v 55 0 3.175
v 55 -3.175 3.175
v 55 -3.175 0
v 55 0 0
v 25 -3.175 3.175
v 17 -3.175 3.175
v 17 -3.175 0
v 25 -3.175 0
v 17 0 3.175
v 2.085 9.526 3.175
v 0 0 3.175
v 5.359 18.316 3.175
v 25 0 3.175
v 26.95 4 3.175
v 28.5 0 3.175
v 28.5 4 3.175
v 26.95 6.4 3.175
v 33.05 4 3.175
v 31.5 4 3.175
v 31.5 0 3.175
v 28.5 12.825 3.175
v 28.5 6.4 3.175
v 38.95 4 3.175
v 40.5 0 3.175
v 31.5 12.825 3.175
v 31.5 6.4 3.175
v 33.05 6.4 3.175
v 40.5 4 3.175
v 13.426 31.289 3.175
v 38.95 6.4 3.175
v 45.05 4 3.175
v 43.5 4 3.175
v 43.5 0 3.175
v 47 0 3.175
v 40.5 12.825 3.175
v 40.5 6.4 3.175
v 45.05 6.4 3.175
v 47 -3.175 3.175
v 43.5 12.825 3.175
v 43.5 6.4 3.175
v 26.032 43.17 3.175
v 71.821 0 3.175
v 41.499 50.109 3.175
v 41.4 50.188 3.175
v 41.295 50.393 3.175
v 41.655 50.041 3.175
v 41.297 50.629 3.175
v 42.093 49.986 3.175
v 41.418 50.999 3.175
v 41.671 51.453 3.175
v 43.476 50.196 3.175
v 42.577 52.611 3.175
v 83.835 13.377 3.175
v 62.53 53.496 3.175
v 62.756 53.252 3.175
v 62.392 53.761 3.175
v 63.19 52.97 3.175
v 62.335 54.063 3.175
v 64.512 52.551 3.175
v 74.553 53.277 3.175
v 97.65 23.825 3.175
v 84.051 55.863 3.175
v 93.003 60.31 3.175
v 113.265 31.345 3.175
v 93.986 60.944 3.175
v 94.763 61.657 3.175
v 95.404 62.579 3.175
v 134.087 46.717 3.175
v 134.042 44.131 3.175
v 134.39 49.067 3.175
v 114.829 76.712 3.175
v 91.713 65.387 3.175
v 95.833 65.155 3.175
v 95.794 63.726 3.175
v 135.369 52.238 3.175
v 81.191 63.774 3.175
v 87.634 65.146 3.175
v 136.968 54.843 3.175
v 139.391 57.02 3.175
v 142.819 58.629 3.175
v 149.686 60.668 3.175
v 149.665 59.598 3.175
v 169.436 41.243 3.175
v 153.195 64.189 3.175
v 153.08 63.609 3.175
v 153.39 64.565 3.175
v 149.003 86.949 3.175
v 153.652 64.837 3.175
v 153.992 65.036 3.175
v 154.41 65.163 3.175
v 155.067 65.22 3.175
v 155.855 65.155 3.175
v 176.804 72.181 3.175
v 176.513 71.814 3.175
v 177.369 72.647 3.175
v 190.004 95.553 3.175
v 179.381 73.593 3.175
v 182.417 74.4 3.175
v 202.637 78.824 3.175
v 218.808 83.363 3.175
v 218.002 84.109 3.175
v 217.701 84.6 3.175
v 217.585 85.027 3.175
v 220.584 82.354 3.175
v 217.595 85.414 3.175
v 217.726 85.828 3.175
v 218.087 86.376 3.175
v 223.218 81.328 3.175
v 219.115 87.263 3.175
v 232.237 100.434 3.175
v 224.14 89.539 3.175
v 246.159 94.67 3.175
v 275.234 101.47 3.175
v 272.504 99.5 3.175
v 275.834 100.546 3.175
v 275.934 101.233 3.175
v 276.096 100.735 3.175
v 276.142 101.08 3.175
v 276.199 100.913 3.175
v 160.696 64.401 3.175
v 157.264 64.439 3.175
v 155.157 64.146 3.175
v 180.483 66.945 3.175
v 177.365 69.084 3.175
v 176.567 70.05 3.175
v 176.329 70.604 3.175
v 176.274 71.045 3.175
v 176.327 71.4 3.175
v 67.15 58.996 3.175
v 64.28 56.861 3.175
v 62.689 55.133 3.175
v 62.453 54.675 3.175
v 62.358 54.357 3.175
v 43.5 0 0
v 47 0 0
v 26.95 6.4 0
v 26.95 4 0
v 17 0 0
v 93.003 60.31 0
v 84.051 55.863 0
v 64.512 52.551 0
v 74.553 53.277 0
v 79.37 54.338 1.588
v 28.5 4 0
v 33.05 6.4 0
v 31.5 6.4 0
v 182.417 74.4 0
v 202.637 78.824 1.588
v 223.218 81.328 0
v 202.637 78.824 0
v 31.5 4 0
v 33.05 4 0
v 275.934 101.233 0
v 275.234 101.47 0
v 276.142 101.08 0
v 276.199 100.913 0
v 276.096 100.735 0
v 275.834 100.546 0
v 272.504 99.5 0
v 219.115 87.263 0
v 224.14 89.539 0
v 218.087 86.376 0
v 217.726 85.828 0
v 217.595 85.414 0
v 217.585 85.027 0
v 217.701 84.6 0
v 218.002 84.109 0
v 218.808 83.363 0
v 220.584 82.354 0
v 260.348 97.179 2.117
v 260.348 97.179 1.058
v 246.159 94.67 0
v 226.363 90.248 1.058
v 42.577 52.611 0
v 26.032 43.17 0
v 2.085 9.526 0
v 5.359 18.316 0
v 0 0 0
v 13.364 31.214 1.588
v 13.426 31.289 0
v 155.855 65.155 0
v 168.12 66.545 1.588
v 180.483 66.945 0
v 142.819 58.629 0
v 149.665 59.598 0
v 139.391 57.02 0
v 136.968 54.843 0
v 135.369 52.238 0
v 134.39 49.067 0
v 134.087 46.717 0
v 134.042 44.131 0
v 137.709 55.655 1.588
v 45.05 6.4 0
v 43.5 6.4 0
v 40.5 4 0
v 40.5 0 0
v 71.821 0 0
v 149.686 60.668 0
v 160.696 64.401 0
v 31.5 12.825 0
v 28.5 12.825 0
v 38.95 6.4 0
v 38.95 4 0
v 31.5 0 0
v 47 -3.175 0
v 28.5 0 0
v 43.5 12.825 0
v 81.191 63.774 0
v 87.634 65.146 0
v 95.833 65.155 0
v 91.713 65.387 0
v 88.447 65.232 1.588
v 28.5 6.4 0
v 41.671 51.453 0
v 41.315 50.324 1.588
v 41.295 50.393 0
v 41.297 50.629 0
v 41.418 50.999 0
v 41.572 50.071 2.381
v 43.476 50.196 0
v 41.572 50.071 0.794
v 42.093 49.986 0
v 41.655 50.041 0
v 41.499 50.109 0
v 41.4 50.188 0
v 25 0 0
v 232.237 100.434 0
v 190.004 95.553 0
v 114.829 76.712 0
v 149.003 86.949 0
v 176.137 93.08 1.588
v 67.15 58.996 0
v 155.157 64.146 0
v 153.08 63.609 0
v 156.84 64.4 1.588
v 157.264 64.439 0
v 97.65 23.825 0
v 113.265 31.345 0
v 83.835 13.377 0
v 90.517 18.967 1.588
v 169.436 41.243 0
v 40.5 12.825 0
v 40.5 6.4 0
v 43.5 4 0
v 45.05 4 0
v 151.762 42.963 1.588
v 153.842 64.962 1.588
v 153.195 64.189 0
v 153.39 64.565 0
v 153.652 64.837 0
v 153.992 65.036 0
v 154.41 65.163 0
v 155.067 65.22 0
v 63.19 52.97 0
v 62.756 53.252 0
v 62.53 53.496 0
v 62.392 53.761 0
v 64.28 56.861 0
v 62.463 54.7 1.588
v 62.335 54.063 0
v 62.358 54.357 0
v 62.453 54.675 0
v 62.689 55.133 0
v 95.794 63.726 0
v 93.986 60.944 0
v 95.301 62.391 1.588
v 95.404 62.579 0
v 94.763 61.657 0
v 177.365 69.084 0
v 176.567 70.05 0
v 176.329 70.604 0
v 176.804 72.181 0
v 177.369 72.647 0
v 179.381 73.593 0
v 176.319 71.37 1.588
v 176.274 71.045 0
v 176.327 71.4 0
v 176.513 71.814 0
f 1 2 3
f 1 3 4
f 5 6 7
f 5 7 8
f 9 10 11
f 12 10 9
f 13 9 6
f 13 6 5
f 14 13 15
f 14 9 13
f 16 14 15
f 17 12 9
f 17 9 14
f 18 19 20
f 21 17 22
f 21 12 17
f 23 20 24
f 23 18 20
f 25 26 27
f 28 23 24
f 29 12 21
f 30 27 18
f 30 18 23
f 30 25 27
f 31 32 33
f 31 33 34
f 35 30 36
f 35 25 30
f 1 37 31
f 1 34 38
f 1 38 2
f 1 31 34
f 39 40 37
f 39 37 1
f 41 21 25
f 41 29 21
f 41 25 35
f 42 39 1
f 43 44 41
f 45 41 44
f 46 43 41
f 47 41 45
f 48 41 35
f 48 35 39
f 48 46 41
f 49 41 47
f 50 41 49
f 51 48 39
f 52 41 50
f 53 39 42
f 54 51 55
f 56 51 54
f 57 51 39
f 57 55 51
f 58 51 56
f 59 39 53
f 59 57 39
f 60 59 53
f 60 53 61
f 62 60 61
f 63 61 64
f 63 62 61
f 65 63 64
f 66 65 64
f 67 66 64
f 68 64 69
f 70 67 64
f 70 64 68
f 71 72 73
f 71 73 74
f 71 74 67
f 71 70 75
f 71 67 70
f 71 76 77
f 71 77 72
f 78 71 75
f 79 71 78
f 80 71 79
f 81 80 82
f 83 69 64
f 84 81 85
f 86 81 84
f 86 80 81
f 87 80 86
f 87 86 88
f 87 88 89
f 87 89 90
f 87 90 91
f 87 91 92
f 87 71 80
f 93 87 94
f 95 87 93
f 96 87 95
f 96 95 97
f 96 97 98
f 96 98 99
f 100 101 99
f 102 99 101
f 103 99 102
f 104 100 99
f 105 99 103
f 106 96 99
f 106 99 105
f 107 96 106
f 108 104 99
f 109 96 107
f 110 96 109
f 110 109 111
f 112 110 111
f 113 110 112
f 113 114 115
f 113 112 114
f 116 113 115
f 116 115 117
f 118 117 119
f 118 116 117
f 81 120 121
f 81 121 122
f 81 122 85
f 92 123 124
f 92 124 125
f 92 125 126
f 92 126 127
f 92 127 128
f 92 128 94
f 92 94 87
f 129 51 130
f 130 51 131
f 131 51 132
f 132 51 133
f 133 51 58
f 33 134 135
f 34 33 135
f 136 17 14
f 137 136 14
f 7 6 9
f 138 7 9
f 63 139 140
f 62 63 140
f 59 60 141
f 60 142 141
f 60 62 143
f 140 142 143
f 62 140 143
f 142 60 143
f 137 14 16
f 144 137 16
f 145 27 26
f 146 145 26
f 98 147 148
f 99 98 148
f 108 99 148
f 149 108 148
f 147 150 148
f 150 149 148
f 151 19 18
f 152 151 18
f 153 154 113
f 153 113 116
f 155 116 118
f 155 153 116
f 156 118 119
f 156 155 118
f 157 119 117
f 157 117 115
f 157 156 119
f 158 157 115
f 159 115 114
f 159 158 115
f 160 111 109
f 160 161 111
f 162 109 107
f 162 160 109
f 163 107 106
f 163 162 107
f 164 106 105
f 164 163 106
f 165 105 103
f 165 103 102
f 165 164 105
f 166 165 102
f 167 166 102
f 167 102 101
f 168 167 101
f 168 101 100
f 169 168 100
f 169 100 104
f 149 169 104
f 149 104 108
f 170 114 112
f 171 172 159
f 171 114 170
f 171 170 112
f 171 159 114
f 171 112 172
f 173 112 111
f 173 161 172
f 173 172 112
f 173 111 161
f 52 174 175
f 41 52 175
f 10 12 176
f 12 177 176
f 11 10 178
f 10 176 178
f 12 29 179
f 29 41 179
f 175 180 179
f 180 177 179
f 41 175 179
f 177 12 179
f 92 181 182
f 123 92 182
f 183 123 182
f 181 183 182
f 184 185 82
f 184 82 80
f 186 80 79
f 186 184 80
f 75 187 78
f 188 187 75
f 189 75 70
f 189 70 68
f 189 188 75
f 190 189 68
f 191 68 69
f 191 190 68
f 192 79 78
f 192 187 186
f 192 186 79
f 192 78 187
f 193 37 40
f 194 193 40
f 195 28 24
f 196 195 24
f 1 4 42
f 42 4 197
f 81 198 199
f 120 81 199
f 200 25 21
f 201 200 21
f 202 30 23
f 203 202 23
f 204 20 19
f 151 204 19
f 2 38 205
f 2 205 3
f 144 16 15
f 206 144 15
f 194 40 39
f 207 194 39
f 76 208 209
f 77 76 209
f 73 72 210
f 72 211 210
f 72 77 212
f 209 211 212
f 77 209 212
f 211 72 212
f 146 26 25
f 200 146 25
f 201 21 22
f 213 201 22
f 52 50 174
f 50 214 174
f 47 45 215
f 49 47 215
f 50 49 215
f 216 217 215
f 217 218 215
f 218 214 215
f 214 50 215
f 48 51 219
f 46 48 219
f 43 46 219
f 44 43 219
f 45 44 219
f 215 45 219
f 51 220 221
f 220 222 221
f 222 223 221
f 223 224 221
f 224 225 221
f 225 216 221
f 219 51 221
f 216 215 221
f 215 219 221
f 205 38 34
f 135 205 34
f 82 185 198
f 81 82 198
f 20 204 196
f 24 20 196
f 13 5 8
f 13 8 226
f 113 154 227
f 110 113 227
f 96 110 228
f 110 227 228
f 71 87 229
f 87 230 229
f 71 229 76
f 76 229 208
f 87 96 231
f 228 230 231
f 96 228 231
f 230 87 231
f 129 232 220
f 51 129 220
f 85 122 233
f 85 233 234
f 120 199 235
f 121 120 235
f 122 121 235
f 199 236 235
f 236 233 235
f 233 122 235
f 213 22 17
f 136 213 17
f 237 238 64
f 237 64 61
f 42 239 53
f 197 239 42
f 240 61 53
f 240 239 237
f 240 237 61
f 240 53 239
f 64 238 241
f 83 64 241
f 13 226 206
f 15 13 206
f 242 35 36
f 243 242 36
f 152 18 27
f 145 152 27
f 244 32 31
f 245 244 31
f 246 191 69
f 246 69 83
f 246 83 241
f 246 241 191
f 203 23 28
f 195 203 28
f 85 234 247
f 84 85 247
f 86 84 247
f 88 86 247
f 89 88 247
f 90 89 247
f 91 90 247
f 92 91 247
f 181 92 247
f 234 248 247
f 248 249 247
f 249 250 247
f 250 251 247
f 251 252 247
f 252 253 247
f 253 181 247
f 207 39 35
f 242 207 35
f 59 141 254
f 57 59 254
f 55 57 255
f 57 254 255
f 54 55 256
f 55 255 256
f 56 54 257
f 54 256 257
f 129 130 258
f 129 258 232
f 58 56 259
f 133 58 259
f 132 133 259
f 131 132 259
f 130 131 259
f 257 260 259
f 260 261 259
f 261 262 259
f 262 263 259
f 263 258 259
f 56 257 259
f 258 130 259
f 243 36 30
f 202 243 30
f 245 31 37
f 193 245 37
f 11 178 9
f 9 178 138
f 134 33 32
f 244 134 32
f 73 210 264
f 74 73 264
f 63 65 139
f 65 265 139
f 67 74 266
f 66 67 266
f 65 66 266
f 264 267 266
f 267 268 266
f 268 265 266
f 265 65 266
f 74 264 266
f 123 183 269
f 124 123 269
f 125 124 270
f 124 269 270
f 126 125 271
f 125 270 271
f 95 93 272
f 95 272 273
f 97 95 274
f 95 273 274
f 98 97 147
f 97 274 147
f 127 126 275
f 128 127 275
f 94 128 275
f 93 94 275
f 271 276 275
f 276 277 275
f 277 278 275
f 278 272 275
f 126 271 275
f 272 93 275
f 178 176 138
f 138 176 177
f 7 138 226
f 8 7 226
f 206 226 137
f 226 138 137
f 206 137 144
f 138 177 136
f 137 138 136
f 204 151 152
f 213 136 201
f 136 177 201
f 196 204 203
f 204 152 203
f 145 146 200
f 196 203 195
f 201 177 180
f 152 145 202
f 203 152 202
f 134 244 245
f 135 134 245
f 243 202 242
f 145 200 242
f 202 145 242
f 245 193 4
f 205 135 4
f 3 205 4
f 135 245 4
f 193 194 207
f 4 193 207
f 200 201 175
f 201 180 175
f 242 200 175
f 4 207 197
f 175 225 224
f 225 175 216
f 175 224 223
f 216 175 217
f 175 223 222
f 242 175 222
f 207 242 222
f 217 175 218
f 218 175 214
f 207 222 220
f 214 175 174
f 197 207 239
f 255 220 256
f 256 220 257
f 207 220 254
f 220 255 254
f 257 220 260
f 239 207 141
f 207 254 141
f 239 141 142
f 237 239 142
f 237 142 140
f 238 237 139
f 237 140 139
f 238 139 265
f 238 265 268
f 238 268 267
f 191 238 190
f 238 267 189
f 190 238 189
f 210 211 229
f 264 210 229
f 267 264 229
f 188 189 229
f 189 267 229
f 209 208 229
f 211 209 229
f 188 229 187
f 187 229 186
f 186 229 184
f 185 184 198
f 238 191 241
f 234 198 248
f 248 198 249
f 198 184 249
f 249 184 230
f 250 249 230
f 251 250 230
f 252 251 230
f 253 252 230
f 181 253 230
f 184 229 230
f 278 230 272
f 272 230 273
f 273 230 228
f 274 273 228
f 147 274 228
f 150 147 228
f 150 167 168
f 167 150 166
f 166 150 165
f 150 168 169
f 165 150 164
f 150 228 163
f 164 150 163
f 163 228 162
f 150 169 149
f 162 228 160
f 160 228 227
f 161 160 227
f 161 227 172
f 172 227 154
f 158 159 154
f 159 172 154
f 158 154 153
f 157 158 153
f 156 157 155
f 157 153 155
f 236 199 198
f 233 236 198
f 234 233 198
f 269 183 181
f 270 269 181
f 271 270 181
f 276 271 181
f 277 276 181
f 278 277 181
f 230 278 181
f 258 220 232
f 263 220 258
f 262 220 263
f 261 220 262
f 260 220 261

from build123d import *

# Parameters (mm, degrees)
BOSS_EXTRUDE1_DEPTH = 3.175
SKETCH3_W           = 8
SKETCH3_H           = 3.175
BOSS_EXTRUDE2_DEPTH = 3.175
CUT_EXTRUDE1_DEPTH  = 295.302026077


with BuildPart() as part:
    # Sketch2 → Boss-Extrude1 (new body)
    with BuildSketch(Plane.XY):
        with BuildLine():
            Line((0, 0), (71.821224644, 0))
            add(Edge.make_bspline(
                [(113.265068403, 31.345085694), (88.49122235, 22.260941948), (71.821224644, 0)],
                knots=[0, 0, 0, 1, 1, 1], degree=2))
            Line((113.265068403, 31.345085694), (169.435947463, 41.242848876))
            add(Edge.make_bspline(
                [(134.041587412, 44.130878692), (151.78543129, 43.239991284), (169.435947463, 41.242848876)],
                knots=[0, 0, 0, 1, 1, 1], degree=2))
            add(Edge.make_bspline(
                [(149.664509426, 59.598208841), (133.564564098, 59.446315657), (134.041587412, 44.130878692)],
                knots=[0, 0, 0, 1, 1, 1], degree=2))
            Line((149.664509426, 59.598208841), (149.685676558, 60.6678268))
            Line((149.685676558, 60.6678268), (160.696312712, 64.401472217))
            add(Edge.make_bspline(
                [(160.696312712, 64.401472217), (156.792494019, 64.794773064), (153.080099679, 63.60900386)],
                knots=[0, 0, 0, 1, 1, 1], degree=2))
            add(Edge.make_bspline(
                [(153.080099679, 63.60900386), (153.21581852, 65.543109048), (155.855294119, 65.154686594)],
                knots=[0, 0, 0, 1, 1, 1], degree=2))
            add(Edge.make_bspline(
                [(155.855294119, 65.154686594), (168.070276532, 67.039683705), (180.482777211, 66.945466473)],
                knots=[0, 0, 0, 1, 1, 1], degree=2))
            add(Edge.make_bspline(
                [(180.482777211, 66.945466473), (171.187708605, 72.067803505), (182.417352528, 74.400222782)],
                knots=[0, 0, 0, 1, 1, 1], degree=2))
            add(Edge.make_bspline(
                [(182.417352528, 74.400222782), (202.456511943, 79.784692432), (223.217555695, 81.328050857)],
                knots=[0, 0, 0, 1, 1, 1], degree=2))
            add(Edge.make_bspline(
                [(275.233904512, 101.469551945), (286.543816843, 98.715878969), (194.296992898, 91.024580871), (223.217555695, 81.328050857)],
                knots=[0, 0, 0, 0, 1, 1, 1, 1], degree=3))
            add(Edge.make_bspline(
                [(275.233904512, 101.469551945), (174.061816158, 103.537553967), (81.190900328, 63.774105239)],
                knots=[0, 0, 0, 1, 1, 1], degree=2))
            add(Edge.make_bspline(
                [(81.190900328, 63.774105239), (88.381783724, 65.999307209), (95.832537282, 65.154686594)],
                knots=[0, 0, 0, 1, 1, 1], degree=2))
            add(Edge.make_bspline(
                [(95.832537282, 65.154686594), (96.183075401, 62.049994654), (93.003333324, 60.309886397)],
                knots=[0, 0, 0, 1, 1, 1], degree=2))
            add(Edge.make_bspline(
                [(93.003333324, 60.309886397), (79.982990497, 52.245061614), (64.511543782, 52.550984526)],
                knots=[0, 0, 0, 1, 1, 1], degree=2))
            add(Edge.make_bspline(
                [(64.511543782, 52.550984526), (59.095264392, 53.626200699), (67.149577001, 58.996482621)],
                knots=[0, 0, 0, 1, 1, 1], degree=2))
            Line((67.149577001, 58.996482621), (43.476372801, 50.196200023))
            add(Edge.make_bspline(
                [(43.476372801, 50.196200023), (39.603225427, 49.243326926), (42.576727954, 52.611474892)],
                knots=[0, 0, 0, 1, 1, 1], degree=2))
            add(Edge.make_bspline(
                [(42.576727954, 52.611474892), (5.440445948, 36.121326287), (0, 0)],
                knots=[0, 0, 0, 1, 1, 1], degree=2))
        make_face()
    extrude(amount=BOSS_EXTRUDE1_DEPTH)

    # Sketch3 → Boss-Extrude2 (add)
    with BuildSketch(Plane.XY.offset(3.175)):
        with Locations((21, -1.5875)):
            Rectangle(SKETCH3_W, SKETCH3_H)
        with Locations((51, -1.5875)):
            Rectangle(SKETCH3_W, SKETCH3_H)
    extrude(amount=-BOSS_EXTRUDE2_DEPTH)

    # Sketch4 → Cut-Extrude1 (cut, through all)
    with BuildSketch(Plane.XY.offset(3.175)):
        Polygon((28.5, 4), (28.5, 0), (31.5, 0), (31.5, 4), (33.05, 4), (33.05, 6.4), (31.5, 6.4), (31.5, 12.825), (28.5, 12.825), (28.5, 6.4), (26.95, 6.4), (26.95, 4), align=None)
        Polygon((40.5, 4), (40.5, 0), (43.5, 0), (43.5, 4), (45.05, 4), (45.05, 6.4), (43.5, 6.4), (43.5, 12.825), (40.5, 12.825), (40.5, 6.4), (38.95, 6.4), (38.95, 4), align=None)
    extrude(amount=-CUT_EXTRUDE1_DEPTH, mode=Mode.SUBTRACT)


solid = part.part
